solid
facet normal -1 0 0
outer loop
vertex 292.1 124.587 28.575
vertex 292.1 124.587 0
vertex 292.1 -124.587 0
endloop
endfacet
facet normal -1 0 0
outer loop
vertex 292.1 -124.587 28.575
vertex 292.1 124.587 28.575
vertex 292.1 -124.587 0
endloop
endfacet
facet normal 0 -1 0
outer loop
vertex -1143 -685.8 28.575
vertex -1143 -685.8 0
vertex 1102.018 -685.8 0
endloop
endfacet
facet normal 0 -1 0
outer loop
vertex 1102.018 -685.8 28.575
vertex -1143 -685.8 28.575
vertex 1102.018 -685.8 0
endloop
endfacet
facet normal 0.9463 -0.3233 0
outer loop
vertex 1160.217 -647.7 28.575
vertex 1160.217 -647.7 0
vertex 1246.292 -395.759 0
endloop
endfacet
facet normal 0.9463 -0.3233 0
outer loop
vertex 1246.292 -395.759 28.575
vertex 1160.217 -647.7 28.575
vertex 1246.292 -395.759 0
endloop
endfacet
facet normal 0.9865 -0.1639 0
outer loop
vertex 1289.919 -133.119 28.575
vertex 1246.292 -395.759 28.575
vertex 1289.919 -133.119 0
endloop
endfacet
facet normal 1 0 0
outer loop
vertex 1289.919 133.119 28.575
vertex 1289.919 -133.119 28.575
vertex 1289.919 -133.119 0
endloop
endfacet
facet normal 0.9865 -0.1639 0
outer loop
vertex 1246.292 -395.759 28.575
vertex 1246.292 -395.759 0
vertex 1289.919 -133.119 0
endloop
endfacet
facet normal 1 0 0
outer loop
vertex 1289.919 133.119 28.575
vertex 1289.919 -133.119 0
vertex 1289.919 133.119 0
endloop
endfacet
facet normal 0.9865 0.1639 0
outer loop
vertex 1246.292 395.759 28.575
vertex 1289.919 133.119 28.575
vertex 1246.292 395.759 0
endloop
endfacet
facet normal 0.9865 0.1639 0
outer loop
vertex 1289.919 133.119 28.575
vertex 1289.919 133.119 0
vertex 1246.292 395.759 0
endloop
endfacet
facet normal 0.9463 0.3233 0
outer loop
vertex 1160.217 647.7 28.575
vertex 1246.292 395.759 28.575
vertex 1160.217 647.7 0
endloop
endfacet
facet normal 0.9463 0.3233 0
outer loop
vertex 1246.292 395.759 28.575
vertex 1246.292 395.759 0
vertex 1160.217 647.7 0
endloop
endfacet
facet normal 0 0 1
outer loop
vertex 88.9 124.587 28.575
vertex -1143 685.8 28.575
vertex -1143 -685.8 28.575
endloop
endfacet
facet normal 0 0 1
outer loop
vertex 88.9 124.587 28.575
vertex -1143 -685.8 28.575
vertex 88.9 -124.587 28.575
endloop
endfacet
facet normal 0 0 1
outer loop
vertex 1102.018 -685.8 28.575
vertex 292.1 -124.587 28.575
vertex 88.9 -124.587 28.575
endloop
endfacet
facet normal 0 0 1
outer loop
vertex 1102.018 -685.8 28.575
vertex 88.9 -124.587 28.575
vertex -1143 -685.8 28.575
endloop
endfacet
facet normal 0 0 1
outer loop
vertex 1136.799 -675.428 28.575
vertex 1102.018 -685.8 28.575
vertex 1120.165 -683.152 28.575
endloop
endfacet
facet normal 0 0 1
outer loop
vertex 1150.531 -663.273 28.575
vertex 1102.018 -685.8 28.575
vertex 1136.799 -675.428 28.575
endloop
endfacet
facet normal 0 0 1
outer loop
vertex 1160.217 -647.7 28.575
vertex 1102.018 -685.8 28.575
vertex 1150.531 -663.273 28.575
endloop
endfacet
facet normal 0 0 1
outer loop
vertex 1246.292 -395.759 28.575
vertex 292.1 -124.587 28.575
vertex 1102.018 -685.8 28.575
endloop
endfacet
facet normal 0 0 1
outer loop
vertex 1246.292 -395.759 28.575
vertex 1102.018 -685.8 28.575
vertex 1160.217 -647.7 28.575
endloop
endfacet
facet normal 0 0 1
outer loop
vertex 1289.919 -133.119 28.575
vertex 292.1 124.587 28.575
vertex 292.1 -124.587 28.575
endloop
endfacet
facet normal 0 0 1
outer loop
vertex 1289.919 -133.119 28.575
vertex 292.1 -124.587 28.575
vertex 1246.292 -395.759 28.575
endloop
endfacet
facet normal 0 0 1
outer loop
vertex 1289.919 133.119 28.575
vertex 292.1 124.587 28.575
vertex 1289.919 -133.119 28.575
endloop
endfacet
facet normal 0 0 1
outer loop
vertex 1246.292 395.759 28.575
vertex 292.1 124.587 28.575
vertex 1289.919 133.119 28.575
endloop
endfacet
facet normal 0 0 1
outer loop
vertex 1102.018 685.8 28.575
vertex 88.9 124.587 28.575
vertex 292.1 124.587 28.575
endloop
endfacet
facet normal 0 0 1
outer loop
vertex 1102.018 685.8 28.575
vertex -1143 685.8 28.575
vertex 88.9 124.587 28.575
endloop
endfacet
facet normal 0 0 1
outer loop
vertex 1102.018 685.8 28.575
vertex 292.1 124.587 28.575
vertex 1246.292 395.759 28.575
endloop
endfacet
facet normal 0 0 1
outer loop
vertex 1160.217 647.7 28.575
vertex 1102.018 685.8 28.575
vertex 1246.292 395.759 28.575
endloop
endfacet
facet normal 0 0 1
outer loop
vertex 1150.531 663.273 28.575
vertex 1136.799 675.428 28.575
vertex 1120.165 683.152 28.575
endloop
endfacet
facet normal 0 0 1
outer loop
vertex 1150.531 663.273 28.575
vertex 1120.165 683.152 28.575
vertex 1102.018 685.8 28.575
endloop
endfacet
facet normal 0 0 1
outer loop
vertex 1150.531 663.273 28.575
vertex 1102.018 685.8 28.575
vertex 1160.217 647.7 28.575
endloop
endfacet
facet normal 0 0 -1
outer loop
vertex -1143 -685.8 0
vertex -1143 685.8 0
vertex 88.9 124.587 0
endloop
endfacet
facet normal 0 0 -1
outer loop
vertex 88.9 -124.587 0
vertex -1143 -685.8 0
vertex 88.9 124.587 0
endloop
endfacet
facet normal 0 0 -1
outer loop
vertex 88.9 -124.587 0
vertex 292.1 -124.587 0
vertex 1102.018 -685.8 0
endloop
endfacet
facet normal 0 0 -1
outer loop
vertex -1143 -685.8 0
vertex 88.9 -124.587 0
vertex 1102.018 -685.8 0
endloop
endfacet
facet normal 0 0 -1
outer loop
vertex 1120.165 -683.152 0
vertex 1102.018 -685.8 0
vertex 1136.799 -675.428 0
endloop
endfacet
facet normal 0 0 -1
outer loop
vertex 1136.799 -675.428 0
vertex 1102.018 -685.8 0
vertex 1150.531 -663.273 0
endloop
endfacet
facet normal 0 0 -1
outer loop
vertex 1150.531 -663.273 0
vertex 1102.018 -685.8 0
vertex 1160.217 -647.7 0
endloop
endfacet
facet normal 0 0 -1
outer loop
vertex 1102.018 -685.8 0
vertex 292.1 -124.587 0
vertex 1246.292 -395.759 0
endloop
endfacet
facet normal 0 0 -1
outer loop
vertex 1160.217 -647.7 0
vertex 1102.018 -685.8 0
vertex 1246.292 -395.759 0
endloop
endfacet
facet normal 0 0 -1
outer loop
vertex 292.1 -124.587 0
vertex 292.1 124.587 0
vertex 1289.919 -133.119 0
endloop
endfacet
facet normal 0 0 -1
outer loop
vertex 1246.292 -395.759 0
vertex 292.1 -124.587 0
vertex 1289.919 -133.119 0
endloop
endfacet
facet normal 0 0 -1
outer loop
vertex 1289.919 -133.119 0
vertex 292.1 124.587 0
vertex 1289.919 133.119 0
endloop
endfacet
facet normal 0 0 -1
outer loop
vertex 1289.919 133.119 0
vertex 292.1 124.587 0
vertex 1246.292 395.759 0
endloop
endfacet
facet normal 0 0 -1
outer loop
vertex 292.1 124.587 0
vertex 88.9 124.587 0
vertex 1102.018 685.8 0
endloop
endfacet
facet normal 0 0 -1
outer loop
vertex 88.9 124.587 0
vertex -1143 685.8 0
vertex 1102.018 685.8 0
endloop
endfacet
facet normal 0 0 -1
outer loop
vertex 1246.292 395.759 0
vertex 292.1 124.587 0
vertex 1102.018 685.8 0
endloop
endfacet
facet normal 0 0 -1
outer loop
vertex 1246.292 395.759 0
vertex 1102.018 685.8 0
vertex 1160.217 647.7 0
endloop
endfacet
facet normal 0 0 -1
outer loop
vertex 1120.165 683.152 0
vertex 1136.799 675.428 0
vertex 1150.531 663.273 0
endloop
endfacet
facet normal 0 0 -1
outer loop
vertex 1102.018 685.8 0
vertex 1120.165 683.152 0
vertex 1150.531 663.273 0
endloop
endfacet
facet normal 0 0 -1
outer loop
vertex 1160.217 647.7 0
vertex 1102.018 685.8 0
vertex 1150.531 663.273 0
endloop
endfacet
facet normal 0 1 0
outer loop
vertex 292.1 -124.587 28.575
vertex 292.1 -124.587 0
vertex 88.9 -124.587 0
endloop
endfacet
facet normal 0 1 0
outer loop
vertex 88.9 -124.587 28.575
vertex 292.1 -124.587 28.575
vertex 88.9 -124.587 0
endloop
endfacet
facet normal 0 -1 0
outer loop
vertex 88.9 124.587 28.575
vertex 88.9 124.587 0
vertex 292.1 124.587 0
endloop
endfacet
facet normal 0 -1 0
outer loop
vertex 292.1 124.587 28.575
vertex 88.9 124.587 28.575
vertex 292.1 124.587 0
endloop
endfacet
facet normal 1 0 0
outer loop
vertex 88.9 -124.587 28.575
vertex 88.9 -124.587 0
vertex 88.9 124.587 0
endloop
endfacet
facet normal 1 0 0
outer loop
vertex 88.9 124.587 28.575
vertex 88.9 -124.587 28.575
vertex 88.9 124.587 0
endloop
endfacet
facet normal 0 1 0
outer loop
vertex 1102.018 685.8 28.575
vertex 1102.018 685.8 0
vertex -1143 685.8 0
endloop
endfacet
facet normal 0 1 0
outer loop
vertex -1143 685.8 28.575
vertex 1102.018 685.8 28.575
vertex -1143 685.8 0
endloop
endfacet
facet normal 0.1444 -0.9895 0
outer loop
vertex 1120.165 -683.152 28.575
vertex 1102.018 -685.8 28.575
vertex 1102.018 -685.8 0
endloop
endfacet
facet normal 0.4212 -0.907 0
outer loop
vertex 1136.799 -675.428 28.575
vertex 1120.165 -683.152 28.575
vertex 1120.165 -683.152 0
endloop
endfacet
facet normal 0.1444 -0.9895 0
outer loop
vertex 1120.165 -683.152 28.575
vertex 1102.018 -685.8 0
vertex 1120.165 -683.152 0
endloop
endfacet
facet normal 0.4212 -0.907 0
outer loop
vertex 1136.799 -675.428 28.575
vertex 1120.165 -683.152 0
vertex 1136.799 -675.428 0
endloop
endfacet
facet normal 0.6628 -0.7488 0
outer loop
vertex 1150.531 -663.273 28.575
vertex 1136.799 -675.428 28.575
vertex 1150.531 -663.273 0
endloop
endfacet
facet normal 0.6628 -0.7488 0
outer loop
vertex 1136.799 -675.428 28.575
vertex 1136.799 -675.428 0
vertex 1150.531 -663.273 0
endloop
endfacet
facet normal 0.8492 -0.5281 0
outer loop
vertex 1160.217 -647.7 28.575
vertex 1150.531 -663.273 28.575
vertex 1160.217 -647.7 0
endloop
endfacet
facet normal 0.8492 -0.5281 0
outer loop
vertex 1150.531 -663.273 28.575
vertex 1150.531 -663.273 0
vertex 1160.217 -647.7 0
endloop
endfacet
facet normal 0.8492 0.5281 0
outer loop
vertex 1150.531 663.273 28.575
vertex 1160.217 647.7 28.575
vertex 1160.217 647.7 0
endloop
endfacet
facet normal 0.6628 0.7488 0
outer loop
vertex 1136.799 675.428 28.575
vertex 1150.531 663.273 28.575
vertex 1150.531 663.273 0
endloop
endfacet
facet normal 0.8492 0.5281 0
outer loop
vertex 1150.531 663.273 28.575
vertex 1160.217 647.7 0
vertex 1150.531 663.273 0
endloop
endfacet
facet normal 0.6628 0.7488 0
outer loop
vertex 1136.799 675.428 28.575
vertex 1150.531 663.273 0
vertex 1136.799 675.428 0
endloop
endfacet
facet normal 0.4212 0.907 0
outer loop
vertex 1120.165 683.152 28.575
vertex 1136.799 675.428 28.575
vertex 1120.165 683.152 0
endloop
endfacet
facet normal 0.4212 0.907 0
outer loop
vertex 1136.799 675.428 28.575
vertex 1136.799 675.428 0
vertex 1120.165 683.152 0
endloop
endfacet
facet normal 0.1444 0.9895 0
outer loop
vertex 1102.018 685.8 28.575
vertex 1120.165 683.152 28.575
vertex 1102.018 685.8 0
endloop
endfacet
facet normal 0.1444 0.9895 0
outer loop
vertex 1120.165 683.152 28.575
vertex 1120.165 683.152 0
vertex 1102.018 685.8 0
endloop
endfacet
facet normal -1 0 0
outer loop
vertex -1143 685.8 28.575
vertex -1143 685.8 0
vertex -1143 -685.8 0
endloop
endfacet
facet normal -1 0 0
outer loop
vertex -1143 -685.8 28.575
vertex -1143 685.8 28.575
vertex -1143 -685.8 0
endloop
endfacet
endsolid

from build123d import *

# Parameters (mm, degrees)
F1_DEPTH = 28.575


# Not quite as in the source:
# - a feature names something its author has since deleted; it is built from what else it names


with BuildPart() as f1:
    # F0 (on Top) → F1 (new body)
    with BuildSketch(Plane.XY):
        with BuildLine():
            Line((1102.0184274855, 685.8), (-1143, 685.8))
            Line((-1143, 685.8), (-1143, 0))
            Line((-1143, 0), (88.9, 0))
            Line((88.9, 0), (88.9, 124.587))
            Line((88.9, 124.587), (292.1, 124.587))
            Line((292.1, 124.587), (292.1, 0))
            Line((292.1, 0), (1143, 0))
            Line((1143, 0), (1295.4, 0))
            ThreePointArc((1295.4, 0), (1261.244047213, 330.8283905438), (1160.2171388114, 647.7))
            ThreePointArc((1160.2171388114, 647.7), (1136.7988098871, 675.4279116849), (1102.0184274855, 685.8))
        make_face()
        with BuildLine():
            Line((88.9, 0), (-1143, 0))
            Line((-1143, 0), (-1143, -685.8))
            Line((-1143, -685.8), (1102.0184274855, -685.8))
            ThreePointArc((1102.0184274855, -685.8), (1136.7988098871, -675.4279116849), (1160.2171388114, -647.7))
            ThreePointArc((1160.2171388114, -647.7), (1261.244047213, -330.8283905438), (1295.4, 0))
            Line((1295.4, 0), (1143, 0))
            Line((1143, 0), (292.1, 0))
            Line((292.1, 0), (292.1, -124.587))
            Line((292.1, -124.587), (88.9, -124.587))
            Line((88.9, -124.587), (88.9, 0))
        make_face()
    extrude(amount=F1_DEPTH)


solid = f1.part
